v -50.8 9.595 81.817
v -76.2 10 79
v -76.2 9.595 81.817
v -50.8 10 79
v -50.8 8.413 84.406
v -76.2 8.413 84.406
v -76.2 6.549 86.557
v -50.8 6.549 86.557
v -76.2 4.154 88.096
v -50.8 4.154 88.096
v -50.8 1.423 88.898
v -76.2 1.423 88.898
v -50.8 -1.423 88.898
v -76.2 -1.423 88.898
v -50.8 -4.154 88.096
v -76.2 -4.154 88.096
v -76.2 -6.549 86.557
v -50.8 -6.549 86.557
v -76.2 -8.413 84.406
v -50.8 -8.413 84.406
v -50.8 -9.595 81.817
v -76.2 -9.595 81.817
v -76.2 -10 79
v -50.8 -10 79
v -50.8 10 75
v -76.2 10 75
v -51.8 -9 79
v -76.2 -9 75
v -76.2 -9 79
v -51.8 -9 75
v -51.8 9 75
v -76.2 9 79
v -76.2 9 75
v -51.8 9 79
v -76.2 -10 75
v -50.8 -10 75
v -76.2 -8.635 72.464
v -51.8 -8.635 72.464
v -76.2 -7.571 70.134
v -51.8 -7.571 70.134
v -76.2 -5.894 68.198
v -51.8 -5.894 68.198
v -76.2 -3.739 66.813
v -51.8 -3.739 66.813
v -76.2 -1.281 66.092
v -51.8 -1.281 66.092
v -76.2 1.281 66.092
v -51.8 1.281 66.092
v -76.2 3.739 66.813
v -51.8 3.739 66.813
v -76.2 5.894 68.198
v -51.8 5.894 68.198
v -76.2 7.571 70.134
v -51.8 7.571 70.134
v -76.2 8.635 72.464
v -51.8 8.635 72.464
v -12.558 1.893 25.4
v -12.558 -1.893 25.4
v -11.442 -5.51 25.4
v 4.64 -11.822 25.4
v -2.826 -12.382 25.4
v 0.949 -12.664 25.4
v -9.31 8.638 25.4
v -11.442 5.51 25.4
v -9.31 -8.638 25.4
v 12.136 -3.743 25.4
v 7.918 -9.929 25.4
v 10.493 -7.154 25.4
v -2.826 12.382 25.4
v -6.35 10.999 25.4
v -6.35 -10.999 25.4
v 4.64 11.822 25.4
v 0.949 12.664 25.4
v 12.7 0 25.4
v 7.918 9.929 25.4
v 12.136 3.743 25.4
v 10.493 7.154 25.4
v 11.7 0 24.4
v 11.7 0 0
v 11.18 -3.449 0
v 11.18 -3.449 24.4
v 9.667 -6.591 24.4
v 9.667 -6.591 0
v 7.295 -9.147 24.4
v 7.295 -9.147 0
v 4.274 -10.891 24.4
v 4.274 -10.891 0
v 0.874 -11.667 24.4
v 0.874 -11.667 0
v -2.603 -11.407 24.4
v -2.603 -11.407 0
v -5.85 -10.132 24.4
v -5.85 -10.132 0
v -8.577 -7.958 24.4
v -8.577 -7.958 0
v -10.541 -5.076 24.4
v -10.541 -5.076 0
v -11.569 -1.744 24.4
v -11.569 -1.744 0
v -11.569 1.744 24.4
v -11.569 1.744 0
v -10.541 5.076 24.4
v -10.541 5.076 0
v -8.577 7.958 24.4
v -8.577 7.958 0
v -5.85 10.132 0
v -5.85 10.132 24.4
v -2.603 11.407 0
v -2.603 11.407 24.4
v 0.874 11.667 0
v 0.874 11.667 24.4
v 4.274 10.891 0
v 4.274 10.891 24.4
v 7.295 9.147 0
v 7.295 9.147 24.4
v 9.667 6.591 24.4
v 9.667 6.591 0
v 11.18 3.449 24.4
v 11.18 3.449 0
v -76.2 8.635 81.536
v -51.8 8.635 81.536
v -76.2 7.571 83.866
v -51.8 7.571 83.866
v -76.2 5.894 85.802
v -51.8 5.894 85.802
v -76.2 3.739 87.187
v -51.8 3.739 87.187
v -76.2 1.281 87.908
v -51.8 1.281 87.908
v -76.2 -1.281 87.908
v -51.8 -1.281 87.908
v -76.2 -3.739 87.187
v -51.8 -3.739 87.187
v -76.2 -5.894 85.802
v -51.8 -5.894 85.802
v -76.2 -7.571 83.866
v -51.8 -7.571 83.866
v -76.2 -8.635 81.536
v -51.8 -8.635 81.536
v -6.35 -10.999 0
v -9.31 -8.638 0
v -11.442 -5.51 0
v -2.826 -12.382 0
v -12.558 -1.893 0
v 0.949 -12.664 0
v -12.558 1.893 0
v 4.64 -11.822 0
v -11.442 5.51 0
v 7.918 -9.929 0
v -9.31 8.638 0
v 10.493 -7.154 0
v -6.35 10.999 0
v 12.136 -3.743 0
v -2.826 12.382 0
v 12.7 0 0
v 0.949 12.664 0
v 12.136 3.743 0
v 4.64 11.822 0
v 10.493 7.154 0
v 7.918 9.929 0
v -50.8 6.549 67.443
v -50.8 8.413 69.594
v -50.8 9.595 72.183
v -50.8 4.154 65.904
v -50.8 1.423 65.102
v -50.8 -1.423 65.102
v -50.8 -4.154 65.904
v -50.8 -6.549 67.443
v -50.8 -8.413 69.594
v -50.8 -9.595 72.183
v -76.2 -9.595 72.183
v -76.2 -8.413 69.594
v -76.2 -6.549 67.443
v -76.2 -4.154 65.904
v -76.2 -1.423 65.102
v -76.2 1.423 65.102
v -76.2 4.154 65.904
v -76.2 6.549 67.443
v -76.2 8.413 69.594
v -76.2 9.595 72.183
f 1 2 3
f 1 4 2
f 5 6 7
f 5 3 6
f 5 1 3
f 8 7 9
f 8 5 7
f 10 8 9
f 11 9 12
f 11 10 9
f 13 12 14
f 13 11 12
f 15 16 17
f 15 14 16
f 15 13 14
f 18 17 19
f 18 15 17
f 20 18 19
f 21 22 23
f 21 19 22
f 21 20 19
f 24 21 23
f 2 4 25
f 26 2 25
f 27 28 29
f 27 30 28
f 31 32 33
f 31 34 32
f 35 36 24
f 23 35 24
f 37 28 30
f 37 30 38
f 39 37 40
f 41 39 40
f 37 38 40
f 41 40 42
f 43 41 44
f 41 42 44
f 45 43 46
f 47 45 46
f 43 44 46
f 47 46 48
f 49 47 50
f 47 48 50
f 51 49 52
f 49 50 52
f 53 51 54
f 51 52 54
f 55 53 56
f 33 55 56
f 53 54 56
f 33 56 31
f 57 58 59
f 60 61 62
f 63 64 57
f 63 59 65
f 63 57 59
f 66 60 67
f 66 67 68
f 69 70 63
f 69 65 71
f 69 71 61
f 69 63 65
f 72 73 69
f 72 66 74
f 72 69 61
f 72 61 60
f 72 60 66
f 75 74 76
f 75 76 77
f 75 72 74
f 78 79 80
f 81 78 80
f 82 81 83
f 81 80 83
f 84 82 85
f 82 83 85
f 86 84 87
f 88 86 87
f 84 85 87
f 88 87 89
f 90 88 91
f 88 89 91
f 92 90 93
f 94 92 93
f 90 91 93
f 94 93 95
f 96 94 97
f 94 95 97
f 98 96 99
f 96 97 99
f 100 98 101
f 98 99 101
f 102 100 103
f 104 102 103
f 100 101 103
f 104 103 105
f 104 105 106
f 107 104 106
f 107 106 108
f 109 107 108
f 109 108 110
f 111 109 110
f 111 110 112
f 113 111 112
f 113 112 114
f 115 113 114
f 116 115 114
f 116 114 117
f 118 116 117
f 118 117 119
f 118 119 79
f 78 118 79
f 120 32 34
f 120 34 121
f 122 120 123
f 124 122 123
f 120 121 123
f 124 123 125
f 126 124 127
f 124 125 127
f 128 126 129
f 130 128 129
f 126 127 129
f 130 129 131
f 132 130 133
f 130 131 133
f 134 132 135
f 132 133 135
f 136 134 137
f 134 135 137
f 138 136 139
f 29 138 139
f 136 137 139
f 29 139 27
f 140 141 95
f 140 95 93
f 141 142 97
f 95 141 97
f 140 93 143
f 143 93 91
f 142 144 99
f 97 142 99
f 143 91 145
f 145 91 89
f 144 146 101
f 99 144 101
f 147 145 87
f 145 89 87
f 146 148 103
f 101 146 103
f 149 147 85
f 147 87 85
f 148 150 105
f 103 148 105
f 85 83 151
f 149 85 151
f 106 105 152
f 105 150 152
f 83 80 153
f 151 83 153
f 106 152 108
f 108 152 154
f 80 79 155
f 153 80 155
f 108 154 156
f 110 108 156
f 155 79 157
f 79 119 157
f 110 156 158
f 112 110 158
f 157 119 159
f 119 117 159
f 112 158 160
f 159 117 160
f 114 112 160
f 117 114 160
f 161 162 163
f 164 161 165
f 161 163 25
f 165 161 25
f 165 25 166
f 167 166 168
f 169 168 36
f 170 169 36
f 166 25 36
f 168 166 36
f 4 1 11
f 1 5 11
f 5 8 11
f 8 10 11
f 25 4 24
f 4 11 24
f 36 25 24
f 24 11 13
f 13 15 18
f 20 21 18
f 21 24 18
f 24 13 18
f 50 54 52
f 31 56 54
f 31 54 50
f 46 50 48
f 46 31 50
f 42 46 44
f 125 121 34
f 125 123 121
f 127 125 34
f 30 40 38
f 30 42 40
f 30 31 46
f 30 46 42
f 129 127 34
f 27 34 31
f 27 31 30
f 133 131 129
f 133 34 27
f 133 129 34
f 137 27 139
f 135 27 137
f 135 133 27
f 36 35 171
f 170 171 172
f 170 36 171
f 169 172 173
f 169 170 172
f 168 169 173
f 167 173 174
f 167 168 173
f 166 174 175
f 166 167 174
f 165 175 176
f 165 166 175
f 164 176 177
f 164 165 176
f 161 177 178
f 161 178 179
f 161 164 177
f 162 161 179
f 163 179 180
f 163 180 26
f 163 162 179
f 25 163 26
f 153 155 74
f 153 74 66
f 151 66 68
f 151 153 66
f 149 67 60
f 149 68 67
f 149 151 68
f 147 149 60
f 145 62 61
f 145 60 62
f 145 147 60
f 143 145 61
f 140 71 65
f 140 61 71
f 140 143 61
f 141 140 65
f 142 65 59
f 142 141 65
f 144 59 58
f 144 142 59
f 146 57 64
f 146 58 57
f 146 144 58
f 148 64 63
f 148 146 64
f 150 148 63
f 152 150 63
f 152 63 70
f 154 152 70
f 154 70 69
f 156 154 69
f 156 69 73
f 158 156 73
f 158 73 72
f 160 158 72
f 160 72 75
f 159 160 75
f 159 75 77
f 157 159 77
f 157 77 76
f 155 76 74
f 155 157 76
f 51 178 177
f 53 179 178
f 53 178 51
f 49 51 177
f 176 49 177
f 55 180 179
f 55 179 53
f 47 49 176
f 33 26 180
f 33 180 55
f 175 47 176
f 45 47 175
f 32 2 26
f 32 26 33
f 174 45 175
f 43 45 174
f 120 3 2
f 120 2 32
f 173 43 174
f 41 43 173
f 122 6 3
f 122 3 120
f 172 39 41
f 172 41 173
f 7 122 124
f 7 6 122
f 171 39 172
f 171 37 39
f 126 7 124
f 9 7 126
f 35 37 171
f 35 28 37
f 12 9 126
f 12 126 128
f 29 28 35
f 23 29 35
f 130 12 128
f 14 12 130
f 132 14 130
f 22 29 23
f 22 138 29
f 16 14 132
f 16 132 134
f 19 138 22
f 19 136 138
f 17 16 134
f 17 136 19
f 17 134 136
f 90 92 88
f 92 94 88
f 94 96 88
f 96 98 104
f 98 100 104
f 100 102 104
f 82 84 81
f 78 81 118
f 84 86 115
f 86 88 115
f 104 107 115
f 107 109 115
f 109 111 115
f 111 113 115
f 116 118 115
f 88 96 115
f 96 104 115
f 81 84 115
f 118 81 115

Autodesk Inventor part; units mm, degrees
ref_plane "YZ Plane" through (0, 0, 0) normal (1, 0, 0) x (0, 1, 0)
sketch "Sketch1" plane through (0, 0, 0) normal (0, 0, 1) x (1, 0, 0)
  circle A0 centre (0, 0) radius 12.7
  dimension "d0" = 25.4
extrude "Extrusion1" add sketch "Sketch1" along normal blind 25.4
sketch "Sketch2" plane through (0, 0, 25.4) normal (0, 0, 1) x (1, 0, 0)
  circle A0 centre (0, 0) radius 12.7 projected
  line L0 (0, 12.7) -> (0, -12.7)
ref_plane "Work Plane1" through (0, 12.7, 25.4) normal (-1, 0, 0) x (0, -1, 0)
ref_plane "Work Plane2" through (-50.8, 12.7, 25.4) normal (-1, 0, 0) x (0, -1, 0)
sketch "Sketch3" plane through (-50.8, 12.7, 25.4) normal (-1, 0, 0) x (0, -1, 0)
  line L0 (0, -25.4) -> (0, 0) projected
  line L1 (0, 0) -> (25.4, 0) projected
  line L2 (2.7, 53.6) -> (2.7, 49.6)
  arc A0 (2.7, 49.6) -> (22.7, 49.6) centre (12.7, 49.6) ccw
  line L3 (22.7, 49.6) -> (22.7, 53.6)
  arc A1 (22.7, 53.6) -> (2.7, 53.6) centre (12.7, 53.6) ccw
  line L4 (12.7, -43.9769) -> (12.7, 86.0616) projected
  line L5 (-27.2073, -25.4) -> (39.5727, -25.4) projected
  dimension "d88" = 10
  dimension "d89" = 4
  dimension "d90" = 75
extrude "Extrusion2" add sketch "Sketch3" along normal blind 25.4 contours A0 L2 A1 L4 | L4 A1 L3 A0
shell "Shell1" thickness 1 removed faces 2 at (-3.6254, -0.9542, 0) at (-76.2, -0.4018, 71.691)
sketch3d "3D Sketch4"
properties part number "loft"
